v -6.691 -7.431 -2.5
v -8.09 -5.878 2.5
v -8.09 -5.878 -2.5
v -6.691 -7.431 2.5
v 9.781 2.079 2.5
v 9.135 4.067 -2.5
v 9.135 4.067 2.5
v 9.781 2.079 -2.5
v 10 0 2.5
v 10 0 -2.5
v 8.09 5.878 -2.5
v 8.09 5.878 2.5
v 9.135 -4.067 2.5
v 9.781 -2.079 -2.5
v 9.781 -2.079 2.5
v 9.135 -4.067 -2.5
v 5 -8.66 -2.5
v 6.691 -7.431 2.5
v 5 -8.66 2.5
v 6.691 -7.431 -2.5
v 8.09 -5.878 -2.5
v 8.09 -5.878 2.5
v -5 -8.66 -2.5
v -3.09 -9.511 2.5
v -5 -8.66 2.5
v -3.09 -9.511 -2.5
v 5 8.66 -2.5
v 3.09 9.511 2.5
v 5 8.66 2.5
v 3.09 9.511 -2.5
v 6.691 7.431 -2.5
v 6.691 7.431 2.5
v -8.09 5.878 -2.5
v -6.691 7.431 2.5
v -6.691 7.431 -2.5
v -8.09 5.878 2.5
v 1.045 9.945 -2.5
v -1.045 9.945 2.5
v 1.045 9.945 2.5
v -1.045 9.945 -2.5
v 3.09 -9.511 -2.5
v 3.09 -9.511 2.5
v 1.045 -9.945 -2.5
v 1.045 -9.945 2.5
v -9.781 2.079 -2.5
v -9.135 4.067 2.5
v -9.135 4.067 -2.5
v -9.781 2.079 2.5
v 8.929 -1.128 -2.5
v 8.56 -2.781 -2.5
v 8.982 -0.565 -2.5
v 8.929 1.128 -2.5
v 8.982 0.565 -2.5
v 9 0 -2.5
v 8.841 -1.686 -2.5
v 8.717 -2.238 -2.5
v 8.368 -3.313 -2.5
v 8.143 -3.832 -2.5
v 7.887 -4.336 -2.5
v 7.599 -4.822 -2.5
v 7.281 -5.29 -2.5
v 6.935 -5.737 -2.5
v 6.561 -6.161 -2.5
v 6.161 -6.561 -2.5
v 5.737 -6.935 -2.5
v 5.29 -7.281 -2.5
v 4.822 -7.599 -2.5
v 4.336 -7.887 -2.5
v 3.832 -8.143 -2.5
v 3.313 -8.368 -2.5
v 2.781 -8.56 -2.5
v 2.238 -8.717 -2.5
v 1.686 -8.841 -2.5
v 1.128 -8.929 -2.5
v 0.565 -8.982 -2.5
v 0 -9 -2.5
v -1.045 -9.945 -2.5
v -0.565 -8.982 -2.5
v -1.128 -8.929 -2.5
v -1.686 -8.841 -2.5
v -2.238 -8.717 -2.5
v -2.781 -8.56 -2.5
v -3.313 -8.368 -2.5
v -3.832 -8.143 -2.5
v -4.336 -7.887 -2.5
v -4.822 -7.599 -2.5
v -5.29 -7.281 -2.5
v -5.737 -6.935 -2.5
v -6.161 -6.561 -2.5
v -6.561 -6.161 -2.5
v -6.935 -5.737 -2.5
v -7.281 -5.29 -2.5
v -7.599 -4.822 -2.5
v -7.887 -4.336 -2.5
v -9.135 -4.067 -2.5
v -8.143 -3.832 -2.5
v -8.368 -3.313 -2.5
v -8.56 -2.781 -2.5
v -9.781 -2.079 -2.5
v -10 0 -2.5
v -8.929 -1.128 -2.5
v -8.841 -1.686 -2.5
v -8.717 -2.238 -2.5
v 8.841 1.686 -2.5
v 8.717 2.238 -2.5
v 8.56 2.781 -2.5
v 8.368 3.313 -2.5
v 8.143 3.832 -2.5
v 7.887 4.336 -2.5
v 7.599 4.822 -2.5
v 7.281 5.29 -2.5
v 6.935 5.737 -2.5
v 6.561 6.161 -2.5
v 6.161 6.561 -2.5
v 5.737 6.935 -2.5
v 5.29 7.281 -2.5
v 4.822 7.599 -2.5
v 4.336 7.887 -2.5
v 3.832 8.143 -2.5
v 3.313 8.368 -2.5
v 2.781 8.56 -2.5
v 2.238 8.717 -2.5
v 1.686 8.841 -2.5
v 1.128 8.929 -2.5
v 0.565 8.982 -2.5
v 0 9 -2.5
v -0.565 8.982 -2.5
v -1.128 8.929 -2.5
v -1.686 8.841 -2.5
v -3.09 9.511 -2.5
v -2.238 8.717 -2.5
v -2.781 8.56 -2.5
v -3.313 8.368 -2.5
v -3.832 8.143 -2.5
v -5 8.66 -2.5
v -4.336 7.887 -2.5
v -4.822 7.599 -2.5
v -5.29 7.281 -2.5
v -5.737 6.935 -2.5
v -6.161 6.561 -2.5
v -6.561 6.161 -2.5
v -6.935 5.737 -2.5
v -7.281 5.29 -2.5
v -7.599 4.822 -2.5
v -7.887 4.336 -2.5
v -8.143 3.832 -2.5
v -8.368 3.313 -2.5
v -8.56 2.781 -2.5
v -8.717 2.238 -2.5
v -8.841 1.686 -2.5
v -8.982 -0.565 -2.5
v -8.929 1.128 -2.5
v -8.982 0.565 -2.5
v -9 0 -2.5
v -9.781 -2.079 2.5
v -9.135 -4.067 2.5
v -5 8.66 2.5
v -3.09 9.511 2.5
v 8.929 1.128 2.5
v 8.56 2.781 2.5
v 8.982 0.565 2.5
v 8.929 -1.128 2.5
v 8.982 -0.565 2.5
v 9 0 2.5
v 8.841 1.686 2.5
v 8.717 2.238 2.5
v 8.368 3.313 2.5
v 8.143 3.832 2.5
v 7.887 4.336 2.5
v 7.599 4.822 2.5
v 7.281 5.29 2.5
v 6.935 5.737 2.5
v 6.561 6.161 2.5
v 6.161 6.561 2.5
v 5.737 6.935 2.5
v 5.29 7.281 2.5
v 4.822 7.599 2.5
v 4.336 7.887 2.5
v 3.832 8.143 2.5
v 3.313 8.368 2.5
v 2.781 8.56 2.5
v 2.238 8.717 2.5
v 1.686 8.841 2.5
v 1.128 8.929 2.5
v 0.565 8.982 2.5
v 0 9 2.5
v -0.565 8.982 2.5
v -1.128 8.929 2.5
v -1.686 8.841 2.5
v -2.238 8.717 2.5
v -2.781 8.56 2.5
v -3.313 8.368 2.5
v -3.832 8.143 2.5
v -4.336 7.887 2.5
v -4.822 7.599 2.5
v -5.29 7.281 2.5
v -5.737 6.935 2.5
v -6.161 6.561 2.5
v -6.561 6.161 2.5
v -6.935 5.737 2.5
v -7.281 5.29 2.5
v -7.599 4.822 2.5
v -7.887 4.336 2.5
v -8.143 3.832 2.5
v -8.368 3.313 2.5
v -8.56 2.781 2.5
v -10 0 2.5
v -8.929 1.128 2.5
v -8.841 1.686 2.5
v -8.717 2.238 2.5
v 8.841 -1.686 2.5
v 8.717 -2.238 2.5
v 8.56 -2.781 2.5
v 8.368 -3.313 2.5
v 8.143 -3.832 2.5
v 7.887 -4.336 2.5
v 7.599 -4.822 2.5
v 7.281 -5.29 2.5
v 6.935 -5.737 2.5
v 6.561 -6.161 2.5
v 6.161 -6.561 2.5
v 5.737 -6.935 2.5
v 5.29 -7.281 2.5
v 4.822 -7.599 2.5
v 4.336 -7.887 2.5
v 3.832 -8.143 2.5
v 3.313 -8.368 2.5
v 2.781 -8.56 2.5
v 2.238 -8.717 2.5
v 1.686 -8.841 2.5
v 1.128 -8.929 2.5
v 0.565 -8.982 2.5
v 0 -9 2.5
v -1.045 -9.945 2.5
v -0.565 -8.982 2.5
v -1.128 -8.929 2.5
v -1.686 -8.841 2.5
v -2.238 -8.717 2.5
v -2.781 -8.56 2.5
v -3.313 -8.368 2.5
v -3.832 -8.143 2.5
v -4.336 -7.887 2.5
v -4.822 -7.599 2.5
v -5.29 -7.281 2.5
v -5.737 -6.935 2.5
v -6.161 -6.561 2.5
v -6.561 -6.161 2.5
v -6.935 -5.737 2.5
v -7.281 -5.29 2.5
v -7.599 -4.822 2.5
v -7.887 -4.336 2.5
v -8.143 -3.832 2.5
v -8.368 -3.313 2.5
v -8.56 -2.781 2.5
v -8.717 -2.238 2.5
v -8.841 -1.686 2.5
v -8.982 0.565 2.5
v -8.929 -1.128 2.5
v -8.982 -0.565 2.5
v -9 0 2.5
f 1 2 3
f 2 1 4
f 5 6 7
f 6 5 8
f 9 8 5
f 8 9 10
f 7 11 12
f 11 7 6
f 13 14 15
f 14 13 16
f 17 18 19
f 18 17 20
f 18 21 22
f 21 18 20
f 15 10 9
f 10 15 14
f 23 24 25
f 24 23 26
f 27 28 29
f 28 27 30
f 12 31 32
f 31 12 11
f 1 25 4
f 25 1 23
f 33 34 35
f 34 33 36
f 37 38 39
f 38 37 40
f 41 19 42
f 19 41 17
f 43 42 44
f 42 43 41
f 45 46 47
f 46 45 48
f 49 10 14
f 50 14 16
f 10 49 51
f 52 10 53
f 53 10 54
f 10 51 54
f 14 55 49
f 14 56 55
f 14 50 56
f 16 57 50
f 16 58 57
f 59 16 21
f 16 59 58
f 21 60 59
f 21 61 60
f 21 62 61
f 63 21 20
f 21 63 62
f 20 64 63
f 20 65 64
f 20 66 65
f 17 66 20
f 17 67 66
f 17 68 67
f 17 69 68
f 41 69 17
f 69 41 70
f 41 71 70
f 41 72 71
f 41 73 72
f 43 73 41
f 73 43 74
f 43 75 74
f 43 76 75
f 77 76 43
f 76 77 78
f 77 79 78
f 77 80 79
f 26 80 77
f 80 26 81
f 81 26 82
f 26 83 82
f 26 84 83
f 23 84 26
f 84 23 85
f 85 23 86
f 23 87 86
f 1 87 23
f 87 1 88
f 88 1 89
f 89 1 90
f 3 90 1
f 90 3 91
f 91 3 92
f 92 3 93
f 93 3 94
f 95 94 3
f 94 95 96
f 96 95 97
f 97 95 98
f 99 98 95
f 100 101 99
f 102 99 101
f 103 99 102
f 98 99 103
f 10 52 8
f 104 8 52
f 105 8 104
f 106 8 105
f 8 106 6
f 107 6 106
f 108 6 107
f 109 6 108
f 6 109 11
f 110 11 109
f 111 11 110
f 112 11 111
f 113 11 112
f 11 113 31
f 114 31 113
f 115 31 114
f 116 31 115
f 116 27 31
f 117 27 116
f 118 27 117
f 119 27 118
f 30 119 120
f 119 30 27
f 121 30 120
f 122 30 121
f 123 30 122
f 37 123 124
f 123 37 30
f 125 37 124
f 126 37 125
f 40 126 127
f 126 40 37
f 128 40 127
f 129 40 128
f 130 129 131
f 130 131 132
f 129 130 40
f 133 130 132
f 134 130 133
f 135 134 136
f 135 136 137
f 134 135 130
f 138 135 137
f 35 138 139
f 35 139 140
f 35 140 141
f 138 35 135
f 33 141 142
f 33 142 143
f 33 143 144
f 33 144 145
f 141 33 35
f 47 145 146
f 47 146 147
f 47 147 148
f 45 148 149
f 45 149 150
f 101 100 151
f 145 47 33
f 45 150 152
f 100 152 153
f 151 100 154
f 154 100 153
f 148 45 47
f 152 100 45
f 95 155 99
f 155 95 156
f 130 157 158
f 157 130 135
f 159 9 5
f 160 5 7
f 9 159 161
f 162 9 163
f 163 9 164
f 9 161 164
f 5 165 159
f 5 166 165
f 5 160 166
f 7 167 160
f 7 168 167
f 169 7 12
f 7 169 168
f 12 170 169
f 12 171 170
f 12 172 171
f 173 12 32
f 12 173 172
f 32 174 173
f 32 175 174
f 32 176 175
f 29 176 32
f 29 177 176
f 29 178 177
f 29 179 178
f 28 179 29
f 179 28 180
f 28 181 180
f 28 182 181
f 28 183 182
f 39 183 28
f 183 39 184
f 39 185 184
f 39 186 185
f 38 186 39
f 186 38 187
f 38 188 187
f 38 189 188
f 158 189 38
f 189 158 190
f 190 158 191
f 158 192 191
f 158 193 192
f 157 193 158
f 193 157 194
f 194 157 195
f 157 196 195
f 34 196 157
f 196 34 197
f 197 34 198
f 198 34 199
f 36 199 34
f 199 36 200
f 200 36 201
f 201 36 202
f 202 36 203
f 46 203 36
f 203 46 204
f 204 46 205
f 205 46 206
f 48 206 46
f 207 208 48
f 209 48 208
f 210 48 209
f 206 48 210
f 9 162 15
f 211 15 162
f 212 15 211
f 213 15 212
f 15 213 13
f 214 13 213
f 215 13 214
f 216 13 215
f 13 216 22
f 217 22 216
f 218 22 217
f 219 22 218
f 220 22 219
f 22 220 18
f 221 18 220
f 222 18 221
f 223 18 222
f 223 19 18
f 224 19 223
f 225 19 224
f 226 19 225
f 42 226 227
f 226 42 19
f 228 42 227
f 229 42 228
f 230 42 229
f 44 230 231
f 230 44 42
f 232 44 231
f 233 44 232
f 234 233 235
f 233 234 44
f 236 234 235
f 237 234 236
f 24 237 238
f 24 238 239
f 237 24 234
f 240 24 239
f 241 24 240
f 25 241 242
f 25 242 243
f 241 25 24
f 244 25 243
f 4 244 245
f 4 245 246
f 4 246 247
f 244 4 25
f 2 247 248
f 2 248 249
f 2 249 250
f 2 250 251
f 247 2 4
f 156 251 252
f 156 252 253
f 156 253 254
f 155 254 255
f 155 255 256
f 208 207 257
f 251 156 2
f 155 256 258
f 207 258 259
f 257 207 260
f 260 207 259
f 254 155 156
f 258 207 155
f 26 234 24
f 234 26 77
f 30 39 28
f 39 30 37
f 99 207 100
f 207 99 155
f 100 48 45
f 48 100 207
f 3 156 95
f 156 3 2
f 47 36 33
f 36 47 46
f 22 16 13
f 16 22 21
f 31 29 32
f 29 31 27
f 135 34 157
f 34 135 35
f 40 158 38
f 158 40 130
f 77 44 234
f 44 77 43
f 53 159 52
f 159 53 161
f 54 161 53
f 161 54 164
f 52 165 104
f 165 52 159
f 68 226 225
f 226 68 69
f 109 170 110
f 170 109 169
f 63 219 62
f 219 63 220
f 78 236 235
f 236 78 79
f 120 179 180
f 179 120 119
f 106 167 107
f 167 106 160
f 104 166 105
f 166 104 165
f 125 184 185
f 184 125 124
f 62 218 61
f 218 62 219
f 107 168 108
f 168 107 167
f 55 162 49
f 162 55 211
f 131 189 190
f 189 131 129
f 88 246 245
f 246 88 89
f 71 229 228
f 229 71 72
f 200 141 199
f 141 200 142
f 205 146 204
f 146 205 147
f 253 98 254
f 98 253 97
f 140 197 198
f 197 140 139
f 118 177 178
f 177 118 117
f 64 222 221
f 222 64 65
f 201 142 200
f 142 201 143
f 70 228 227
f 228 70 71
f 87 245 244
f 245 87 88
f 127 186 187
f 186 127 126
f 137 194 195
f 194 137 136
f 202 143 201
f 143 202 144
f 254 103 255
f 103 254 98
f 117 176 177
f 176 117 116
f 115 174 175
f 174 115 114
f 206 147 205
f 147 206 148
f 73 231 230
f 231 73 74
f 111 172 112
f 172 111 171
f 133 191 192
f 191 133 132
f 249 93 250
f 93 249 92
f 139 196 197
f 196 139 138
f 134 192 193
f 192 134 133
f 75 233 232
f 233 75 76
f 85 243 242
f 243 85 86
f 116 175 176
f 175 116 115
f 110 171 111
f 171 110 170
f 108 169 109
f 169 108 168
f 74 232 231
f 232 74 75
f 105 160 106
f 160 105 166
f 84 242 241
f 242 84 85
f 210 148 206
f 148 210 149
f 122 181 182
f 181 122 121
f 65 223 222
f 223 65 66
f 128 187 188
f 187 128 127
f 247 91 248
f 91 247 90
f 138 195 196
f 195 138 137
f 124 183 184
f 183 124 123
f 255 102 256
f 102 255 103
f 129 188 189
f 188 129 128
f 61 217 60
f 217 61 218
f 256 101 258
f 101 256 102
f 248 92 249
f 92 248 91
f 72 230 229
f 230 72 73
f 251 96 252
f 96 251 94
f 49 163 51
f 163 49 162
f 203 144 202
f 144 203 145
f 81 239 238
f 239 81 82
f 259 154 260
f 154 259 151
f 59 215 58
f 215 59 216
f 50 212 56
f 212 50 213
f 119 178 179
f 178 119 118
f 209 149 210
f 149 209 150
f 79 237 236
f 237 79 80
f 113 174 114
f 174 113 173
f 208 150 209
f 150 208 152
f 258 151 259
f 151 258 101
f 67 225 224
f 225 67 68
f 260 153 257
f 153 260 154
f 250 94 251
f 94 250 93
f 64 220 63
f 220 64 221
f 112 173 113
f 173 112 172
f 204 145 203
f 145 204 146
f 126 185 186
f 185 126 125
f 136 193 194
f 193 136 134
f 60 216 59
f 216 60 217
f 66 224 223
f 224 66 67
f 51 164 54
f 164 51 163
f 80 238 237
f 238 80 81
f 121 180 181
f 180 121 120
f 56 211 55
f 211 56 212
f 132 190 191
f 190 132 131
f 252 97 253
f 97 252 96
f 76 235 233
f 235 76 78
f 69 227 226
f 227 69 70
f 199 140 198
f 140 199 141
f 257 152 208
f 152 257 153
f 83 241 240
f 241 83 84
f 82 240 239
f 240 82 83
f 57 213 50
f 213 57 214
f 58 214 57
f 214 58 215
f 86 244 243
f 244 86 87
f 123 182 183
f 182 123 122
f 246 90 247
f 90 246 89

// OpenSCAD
difference(){
    color([1,.7,0]) cylinder(h=5, r=10, center=true);
    cylinder(h=5.1, r=9, center=true, $fn=100);
}
color([1,.4,0]) text("λ", halign="center", valign="center", size=13);
